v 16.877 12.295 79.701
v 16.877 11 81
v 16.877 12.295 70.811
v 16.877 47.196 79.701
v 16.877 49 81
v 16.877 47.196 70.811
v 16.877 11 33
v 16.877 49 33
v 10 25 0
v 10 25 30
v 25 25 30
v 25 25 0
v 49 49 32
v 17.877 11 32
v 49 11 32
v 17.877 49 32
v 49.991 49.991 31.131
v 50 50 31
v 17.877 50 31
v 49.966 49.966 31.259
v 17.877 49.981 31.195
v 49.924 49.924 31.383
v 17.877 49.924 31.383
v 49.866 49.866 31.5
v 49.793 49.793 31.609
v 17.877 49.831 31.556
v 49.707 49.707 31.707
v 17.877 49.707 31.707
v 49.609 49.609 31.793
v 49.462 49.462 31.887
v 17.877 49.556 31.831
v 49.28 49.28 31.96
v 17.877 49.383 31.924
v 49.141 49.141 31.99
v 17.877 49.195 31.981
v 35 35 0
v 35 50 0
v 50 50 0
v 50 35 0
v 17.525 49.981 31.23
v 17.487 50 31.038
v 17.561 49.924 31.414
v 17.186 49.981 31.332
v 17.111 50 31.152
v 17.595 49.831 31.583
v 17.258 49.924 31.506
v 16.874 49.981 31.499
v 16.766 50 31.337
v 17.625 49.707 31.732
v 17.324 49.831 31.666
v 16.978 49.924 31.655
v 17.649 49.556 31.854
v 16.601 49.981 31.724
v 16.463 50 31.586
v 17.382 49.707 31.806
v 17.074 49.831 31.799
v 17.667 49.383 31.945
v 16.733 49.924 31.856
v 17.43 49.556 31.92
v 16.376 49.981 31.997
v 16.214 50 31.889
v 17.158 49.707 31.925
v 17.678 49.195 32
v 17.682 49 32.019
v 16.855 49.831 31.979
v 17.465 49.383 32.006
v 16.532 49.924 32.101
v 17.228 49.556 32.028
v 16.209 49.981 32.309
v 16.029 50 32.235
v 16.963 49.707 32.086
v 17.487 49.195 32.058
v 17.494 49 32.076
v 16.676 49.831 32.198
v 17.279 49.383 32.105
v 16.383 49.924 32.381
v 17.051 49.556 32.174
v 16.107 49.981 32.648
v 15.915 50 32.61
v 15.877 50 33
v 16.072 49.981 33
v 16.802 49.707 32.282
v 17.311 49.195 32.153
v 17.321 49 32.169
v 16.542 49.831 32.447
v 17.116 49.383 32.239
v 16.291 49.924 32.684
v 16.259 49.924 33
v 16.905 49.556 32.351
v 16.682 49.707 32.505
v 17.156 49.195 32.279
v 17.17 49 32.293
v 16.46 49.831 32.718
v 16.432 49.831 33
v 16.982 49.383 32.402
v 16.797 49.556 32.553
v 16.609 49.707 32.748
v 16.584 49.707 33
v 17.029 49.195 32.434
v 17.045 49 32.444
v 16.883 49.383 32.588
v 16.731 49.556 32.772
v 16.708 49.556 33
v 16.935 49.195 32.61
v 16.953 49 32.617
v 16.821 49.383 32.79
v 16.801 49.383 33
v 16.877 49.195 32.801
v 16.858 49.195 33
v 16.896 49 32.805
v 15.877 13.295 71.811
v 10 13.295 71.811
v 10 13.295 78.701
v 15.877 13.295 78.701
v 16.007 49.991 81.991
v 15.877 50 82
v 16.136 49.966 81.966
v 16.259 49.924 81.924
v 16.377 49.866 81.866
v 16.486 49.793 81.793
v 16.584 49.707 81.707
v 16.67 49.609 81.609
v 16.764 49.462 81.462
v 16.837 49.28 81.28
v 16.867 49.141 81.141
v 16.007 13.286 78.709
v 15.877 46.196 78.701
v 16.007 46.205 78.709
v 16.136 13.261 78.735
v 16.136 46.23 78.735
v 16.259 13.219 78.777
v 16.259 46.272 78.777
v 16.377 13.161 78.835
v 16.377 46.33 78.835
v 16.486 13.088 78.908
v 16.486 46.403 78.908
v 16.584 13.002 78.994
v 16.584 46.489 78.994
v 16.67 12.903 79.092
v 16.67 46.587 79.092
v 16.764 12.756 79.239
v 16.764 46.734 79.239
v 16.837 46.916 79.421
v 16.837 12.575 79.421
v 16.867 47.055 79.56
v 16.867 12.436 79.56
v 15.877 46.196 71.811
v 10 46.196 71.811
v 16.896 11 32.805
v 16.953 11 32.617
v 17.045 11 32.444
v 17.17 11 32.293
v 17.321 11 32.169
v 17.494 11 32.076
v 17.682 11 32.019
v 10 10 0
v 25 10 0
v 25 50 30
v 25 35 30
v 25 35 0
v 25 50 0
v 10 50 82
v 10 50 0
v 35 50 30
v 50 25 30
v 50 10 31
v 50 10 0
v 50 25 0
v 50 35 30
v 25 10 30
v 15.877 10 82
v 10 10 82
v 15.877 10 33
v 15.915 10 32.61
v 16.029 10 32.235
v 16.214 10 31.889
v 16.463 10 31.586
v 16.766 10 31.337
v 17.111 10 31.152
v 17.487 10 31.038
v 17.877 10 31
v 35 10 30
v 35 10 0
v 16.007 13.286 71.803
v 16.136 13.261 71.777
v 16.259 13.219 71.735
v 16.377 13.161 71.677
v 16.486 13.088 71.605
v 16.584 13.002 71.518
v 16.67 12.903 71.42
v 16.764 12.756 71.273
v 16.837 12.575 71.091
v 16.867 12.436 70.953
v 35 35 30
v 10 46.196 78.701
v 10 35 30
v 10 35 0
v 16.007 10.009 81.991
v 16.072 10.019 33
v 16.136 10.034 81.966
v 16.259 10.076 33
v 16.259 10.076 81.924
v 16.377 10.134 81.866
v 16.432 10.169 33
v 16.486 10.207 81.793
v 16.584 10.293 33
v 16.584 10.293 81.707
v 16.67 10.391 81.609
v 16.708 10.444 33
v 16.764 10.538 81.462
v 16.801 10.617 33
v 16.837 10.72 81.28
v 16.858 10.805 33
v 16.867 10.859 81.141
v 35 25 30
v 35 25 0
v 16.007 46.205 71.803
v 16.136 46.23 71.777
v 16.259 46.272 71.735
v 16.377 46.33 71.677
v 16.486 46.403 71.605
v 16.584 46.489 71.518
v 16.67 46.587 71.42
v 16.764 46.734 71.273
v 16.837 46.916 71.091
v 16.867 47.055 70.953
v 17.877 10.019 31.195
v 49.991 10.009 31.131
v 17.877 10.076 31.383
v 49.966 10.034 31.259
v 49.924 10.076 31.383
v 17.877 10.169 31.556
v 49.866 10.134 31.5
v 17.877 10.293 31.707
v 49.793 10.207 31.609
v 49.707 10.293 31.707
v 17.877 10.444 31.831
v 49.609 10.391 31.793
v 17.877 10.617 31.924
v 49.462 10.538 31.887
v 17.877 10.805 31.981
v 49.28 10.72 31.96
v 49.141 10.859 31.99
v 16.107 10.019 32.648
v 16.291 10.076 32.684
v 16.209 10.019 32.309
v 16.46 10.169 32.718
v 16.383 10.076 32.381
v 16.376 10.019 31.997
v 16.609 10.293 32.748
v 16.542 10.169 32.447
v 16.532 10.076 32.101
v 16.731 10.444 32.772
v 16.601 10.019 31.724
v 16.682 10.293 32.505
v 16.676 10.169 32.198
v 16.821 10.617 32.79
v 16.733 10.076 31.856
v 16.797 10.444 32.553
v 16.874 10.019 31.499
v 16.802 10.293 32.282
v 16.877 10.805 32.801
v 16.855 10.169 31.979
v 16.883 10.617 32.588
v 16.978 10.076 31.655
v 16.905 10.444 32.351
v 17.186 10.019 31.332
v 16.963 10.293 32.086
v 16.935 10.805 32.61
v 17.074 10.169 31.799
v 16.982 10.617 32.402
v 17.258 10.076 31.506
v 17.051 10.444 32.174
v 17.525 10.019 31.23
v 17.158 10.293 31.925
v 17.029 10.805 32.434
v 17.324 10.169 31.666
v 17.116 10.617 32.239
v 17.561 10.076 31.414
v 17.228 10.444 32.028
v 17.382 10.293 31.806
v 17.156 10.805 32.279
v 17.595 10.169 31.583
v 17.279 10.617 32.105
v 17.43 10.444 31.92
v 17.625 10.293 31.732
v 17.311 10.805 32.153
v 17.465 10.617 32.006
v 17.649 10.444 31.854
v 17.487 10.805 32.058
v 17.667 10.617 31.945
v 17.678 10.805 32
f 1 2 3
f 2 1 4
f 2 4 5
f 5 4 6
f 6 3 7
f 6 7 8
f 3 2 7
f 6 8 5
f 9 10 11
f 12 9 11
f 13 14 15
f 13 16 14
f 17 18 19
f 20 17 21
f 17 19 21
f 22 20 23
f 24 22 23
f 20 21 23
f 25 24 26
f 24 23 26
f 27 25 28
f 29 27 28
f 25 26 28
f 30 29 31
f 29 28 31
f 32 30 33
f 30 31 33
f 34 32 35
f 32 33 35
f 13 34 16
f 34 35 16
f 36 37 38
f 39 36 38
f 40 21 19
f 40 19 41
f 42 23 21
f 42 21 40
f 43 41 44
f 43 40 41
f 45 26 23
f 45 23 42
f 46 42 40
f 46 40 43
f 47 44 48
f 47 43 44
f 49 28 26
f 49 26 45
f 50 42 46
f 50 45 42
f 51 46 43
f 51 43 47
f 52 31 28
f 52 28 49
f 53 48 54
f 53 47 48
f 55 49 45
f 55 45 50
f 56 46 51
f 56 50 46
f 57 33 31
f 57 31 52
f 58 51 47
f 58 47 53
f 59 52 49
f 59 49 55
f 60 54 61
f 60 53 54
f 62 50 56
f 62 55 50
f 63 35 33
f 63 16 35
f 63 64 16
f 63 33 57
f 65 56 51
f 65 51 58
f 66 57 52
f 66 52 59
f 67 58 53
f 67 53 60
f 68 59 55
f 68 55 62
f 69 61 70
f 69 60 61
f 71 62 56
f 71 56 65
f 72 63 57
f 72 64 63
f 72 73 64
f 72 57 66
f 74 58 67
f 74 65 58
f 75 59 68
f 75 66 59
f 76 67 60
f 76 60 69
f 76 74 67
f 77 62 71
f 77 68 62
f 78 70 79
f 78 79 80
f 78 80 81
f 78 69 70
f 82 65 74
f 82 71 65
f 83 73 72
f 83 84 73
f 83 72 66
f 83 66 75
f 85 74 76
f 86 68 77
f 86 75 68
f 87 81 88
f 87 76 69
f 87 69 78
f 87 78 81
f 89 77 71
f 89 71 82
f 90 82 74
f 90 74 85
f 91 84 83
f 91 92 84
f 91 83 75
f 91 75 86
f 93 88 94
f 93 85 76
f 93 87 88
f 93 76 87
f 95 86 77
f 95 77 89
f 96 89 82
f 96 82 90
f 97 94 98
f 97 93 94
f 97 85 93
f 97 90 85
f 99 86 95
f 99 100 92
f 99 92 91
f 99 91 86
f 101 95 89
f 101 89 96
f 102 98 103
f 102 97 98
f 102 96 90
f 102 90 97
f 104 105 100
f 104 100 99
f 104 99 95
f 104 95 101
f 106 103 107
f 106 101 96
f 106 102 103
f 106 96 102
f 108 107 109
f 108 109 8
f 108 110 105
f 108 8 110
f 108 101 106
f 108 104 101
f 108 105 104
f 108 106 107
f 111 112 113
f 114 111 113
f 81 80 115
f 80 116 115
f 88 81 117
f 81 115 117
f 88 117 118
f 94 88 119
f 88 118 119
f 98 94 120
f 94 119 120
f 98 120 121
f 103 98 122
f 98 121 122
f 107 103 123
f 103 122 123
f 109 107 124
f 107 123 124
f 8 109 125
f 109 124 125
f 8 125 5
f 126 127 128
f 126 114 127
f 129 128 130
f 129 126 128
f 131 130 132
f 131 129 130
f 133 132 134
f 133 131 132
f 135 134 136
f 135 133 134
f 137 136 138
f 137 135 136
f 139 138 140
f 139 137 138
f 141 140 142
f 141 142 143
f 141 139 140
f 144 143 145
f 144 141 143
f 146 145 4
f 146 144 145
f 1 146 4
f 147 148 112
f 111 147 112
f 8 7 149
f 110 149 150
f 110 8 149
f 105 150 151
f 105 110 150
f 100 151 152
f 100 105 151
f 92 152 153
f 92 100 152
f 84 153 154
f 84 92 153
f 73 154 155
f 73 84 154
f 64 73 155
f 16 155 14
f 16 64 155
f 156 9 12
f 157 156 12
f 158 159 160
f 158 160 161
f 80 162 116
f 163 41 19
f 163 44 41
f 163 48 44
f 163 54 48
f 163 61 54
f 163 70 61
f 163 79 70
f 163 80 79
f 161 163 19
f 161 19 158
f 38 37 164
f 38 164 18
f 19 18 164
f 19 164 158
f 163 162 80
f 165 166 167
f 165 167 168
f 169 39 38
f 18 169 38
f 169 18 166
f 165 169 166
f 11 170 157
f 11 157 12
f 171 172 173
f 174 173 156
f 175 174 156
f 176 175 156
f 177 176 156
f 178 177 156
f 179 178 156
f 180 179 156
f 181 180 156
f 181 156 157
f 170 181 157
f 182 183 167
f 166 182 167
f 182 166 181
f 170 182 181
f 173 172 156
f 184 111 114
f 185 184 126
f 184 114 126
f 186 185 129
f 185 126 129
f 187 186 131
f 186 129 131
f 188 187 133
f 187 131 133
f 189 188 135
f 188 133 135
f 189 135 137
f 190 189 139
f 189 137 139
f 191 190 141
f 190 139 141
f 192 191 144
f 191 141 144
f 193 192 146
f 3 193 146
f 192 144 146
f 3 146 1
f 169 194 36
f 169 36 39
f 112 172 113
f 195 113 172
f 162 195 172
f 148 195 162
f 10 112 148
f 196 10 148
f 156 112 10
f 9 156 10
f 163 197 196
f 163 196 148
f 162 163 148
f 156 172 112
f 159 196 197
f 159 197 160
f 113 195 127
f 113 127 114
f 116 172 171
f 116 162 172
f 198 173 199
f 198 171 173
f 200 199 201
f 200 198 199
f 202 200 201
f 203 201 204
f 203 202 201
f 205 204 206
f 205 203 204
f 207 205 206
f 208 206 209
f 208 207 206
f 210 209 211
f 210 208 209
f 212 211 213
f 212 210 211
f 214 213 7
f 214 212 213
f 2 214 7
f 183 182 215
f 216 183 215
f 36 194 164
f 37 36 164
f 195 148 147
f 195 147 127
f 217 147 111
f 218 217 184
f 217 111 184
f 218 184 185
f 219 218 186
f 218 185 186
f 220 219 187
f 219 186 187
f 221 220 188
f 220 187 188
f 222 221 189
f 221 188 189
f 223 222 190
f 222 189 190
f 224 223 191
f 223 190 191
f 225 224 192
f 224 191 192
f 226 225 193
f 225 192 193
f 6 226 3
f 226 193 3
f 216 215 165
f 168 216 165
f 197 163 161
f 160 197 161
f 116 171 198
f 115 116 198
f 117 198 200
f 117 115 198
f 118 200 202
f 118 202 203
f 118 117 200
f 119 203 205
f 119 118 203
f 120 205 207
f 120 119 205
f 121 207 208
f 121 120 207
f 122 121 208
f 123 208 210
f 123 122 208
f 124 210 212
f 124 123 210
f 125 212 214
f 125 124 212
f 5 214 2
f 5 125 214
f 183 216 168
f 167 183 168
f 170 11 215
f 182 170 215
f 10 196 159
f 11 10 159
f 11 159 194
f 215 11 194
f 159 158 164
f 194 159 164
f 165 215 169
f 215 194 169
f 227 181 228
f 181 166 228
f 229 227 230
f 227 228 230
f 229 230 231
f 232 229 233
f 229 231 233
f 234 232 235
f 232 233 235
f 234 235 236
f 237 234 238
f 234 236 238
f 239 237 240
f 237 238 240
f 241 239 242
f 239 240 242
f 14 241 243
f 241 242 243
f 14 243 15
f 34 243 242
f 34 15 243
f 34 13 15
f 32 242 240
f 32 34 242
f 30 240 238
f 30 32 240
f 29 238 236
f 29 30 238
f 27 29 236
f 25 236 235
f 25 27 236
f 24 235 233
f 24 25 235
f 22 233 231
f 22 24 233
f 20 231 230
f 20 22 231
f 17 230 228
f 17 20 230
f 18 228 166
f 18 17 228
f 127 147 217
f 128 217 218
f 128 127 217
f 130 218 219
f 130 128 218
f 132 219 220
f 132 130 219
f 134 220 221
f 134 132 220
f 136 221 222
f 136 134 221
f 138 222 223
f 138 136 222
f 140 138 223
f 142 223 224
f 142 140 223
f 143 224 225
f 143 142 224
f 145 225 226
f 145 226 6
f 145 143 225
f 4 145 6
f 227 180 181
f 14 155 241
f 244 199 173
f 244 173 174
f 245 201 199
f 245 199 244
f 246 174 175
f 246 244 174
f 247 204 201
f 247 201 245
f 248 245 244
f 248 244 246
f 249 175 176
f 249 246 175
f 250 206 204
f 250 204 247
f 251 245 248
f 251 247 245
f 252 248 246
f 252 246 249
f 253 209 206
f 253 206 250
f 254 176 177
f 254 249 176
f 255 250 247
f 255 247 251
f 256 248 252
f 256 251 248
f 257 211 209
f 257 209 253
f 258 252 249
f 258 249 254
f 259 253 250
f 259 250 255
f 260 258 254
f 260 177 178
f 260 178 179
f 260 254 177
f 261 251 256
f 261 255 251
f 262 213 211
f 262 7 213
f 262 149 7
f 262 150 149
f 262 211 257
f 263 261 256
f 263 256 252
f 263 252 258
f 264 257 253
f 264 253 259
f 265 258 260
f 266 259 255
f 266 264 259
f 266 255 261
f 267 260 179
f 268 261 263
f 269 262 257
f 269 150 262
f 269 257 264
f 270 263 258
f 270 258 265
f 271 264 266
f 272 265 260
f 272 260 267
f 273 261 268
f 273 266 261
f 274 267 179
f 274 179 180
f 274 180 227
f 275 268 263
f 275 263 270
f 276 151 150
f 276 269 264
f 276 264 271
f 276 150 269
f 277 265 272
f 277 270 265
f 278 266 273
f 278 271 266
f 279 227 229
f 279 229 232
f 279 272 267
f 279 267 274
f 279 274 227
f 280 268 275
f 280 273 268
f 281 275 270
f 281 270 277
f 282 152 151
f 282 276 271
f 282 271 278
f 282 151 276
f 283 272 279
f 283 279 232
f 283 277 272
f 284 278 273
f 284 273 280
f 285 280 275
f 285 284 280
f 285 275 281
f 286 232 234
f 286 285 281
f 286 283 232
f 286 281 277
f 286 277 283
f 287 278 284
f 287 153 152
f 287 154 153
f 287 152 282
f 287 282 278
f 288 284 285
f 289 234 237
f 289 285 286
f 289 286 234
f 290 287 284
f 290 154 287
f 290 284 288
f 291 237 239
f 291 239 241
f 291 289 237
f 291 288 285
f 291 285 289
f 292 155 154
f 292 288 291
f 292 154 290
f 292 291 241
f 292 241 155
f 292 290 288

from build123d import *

# Parameters (mm, degrees)
F0_W     = 15
F0_H     = 15
F1_DEPTH = 30
F2_W     = 15
F2_H     = 15
F3_DEPTH = 2
F4_W     = 6.8767888099
F4_H     = 40
F5_DEPTH = 50
F6_W     = 32.9012749717
F6_H     = 6.8896561861
F7_DEPTH = 30
F8_R     = 1


with BuildPart() as f1:
    # F0 (on Top) → F1 (new body)
    with BuildSketch(Plane.XY):
        with Locations((42.5, 17.5)):
            Rectangle(F0_W, F0_H)
    extrude(amount=F1_DEPTH)



with BuildPart() as f1b:
    # F0 (on Top) → F1, piece 2 (new body)
    with BuildSketch(Plane.XY):
        with Locations((17.5, 17.5)):
            Rectangle(F0_W, F0_H)
    extrude(amount=F1_DEPTH)


with BuildPart() as f1c:
    # F0 (on Top) → F1, piece 3 (new body)
    with BuildSketch(Plane.XY):
        with Locations((17.5, 42.5)):
            Rectangle(F0_W, F0_H)
    extrude(amount=F1_DEPTH)


with BuildPart() as f1d:
    # F0 (on Top) → F1, piece 4 (new body)
    with BuildSketch(Plane.XY):
        with Locations((42.5, 42.5)):
            Rectangle(F0_W, F0_H)
    extrude(amount=F1_DEPTH)


with BuildPart() as f1_1:
    add(f1.part)

    add(f1b.part)  # F3 merges F1b

    add(f1c.part)  # F3 merges F1c

    add(f1d.part)  # F3 merges F1d
    # F2 (on face) → F3 (join)
    with BuildSketch(Plane.XY.offset(30)):
        with Locations((42.5, 17.5)):
            Rectangle(F2_W, F2_H)
        Polygon((10, 10), (35, 10), (35, 25), (50, 25), (50, 50), (10, 50), align=None)
    extrude(amount=F3_DEPTH)

    # F4 (on face) → F5 (join)
    with BuildSketch(Plane.XY.offset(32)):
        with Locations((13.4383944049, 30)):
            Rectangle(F4_W, F4_H)
    extrude(amount=F5_DEPTH)

    # F6 (on face) → F7 (cut)
    with BuildSketch(Plane(origin=(10, 0, 0), x_dir=(0, -1, 0), z_dir=(-1, 0, 0))):
        with Locations((-29.7453277744, 75.2560794353)):
            Rectangle(F6_W, F6_H)
    extrude(amount=-F7_DEPTH, mode=Mode.SUBTRACT)

    # F8
    f8_edges = [f1_1.edges().sort_by_distance(p)[0] for p in [
        (33.438394, 10, 32),
        (16.876789, 30, 32),
        (33.438394, 50, 32),
        (50, 30, 32),
        (16.876789, 10, 57),
        (16.876789, 30, 82),
        (16.876789, 50, 57),
        (16.876789, 29.745328, 78.700908),
        (16.876789, 46.195965, 75.256079),
        (16.876789, 29.745328, 71.811251),
        (16.876789, 13.29469, 75.256079),
    ]]
    fillet(f8_edges, radius=F8_R)


solid = f1_1.part
